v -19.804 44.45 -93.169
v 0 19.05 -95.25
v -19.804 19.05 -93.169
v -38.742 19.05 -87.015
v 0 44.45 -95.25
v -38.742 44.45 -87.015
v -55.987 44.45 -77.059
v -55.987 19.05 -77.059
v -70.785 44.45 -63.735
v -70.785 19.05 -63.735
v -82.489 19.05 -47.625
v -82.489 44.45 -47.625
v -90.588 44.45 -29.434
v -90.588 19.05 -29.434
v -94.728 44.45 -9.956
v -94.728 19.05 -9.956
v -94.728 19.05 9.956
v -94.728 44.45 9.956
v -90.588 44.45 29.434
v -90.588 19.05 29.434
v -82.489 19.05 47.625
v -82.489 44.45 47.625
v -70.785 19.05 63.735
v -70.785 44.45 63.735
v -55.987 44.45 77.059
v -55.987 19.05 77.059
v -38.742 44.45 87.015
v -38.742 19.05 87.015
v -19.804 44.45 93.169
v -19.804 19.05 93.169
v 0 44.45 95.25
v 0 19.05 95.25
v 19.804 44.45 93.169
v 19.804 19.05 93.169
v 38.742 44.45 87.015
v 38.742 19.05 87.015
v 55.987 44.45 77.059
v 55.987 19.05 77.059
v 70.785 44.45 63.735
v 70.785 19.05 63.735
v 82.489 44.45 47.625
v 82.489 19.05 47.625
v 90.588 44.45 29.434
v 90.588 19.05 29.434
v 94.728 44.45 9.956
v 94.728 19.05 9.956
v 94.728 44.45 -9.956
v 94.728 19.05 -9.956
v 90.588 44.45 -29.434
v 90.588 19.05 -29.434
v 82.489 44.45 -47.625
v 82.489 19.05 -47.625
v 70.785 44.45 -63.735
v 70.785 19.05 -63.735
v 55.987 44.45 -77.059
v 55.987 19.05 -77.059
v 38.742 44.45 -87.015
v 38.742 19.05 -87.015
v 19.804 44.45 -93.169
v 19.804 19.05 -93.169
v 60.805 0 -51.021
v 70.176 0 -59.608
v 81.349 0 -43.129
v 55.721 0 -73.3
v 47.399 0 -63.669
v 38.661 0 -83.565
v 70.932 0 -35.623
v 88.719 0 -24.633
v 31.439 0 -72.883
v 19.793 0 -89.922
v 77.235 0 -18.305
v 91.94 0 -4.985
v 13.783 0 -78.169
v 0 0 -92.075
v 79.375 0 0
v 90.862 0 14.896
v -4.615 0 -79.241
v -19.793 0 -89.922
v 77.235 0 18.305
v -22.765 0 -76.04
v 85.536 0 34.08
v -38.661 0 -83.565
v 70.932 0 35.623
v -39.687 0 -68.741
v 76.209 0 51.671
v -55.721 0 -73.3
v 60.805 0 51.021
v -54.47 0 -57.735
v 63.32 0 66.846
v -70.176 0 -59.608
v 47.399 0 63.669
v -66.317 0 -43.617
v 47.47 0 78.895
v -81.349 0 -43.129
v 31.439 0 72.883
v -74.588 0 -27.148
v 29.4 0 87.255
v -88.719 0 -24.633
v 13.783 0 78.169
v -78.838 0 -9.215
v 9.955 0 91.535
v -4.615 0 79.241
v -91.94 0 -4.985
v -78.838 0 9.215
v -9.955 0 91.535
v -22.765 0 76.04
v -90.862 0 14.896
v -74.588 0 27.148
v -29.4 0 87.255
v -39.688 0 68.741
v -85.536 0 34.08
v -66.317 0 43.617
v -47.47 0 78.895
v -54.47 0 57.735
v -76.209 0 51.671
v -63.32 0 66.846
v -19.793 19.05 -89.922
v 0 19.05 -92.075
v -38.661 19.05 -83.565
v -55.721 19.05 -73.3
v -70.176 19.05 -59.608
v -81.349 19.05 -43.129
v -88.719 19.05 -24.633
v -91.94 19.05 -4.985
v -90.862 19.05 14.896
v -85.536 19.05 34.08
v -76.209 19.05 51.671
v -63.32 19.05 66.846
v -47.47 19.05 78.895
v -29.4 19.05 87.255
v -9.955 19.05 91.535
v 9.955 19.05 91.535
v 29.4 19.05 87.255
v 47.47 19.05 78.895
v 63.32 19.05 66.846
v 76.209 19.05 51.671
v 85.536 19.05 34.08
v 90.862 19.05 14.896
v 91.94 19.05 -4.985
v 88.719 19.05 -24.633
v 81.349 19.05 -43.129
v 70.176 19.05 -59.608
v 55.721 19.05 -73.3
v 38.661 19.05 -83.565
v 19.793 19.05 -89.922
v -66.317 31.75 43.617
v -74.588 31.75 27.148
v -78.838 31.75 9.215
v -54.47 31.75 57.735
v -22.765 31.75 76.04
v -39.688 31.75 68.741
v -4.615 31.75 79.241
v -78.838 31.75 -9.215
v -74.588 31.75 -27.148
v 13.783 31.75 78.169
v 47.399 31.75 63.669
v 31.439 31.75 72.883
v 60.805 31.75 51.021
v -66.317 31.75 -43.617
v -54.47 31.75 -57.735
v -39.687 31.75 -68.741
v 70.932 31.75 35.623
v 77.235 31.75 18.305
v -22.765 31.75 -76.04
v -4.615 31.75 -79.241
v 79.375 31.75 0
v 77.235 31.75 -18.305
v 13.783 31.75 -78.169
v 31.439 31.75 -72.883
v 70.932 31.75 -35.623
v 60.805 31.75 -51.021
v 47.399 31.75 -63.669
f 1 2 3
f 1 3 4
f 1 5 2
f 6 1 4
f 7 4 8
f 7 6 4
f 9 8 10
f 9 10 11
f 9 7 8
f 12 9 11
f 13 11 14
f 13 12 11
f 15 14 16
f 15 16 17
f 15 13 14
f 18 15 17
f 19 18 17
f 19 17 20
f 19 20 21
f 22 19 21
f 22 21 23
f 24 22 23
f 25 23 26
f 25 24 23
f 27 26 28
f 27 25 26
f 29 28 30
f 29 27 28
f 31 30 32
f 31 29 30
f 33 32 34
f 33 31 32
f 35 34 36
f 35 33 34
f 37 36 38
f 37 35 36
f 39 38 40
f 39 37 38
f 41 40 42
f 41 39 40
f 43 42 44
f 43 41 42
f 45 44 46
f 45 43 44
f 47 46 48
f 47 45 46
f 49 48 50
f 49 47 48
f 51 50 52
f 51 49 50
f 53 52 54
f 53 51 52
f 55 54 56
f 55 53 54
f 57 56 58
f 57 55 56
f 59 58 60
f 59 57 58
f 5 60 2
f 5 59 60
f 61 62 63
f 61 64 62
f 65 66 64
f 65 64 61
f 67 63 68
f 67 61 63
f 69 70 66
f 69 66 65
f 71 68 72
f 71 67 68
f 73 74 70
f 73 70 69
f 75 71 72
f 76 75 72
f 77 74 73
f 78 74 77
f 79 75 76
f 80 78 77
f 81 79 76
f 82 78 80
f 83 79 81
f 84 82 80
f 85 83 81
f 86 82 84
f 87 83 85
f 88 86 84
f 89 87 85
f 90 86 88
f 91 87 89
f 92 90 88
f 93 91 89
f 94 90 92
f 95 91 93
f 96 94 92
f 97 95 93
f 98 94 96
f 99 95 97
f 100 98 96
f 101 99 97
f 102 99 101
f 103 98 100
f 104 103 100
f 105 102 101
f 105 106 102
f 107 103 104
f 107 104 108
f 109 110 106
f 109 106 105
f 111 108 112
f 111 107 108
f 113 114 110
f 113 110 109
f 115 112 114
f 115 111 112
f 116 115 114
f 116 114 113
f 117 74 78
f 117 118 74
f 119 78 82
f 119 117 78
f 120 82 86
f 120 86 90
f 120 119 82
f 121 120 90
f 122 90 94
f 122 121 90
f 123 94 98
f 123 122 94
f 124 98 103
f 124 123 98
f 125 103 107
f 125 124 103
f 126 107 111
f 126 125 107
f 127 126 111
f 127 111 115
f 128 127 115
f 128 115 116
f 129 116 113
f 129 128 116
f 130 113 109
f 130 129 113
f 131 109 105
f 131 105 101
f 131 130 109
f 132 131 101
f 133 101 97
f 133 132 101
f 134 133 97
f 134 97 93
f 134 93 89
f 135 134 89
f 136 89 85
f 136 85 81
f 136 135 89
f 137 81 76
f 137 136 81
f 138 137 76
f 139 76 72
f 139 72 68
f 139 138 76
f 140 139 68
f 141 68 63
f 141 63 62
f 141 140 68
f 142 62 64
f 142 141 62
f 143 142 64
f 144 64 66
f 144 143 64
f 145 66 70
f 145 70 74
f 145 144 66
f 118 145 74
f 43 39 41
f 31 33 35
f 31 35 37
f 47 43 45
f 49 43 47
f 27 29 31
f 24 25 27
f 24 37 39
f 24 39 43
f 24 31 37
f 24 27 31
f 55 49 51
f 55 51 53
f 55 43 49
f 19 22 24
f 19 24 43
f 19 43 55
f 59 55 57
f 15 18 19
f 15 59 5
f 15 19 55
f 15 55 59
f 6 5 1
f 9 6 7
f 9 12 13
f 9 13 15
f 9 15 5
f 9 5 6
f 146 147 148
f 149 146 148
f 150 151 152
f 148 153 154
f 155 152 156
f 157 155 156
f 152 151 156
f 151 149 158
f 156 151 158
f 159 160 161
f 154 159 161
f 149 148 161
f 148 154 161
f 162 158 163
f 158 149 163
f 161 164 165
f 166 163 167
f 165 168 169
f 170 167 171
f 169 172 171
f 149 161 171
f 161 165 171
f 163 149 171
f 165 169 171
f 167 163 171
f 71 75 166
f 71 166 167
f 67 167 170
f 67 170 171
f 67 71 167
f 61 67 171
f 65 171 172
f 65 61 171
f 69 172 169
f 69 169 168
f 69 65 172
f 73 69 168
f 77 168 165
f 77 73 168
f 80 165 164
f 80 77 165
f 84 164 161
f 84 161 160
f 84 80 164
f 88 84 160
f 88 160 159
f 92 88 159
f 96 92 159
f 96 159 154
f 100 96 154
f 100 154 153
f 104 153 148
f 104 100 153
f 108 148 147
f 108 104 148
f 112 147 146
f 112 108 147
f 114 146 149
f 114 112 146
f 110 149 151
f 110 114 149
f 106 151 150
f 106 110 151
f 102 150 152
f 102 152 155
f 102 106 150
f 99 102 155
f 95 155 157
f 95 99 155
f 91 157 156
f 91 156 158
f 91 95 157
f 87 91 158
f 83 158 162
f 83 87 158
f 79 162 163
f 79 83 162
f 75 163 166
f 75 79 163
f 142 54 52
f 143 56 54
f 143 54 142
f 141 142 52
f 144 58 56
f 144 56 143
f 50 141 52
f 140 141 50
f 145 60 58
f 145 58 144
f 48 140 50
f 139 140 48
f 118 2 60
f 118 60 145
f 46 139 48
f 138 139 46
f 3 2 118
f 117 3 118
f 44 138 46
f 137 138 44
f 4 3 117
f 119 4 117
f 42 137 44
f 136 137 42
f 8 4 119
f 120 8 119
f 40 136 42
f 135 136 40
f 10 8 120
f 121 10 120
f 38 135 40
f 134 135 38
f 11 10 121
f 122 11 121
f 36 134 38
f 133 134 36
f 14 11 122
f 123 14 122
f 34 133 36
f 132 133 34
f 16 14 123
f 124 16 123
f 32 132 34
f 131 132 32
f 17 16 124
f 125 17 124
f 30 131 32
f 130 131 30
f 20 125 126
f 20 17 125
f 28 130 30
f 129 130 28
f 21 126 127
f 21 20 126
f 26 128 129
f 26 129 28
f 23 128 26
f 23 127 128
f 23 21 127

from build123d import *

# Parameters (mm, degrees)
SHELL1_OUTLINE_R = 79.375
SHELL1_DEPTH     = 31.75


# Read off the part's stored shape, not the designer's step: Shell1
with BuildPart() as part:
    # Sketch1 → Revolve1 (revolve)
    with BuildSketch(Plane.XY, mode=Mode.PRIVATE) as revolve1_sk:
        Polygon((0, 0), (92.075, 0), (92.075, 19.05), (95.25, 19.05), (95.25, 44.45), (0, 44.45), align=None)
    revolve(revolve1_sk.sketch.rotate(Axis((0, 0, 0), (0, 1, 0)), 90), axis=Axis((0, 0, 0), (0, 1, 0)))

    # Shell1 outline → Shell1 (cut)
    with BuildSketch(Plane(origin=(0, 0, 0), x_dir=(1, 0, 0), z_dir=(0, 1, 0))):
        Circle(SHELL1_OUTLINE_R)
    extrude(amount=SHELL1_DEPTH, mode=Mode.SUBTRACT)


solid = part.part
